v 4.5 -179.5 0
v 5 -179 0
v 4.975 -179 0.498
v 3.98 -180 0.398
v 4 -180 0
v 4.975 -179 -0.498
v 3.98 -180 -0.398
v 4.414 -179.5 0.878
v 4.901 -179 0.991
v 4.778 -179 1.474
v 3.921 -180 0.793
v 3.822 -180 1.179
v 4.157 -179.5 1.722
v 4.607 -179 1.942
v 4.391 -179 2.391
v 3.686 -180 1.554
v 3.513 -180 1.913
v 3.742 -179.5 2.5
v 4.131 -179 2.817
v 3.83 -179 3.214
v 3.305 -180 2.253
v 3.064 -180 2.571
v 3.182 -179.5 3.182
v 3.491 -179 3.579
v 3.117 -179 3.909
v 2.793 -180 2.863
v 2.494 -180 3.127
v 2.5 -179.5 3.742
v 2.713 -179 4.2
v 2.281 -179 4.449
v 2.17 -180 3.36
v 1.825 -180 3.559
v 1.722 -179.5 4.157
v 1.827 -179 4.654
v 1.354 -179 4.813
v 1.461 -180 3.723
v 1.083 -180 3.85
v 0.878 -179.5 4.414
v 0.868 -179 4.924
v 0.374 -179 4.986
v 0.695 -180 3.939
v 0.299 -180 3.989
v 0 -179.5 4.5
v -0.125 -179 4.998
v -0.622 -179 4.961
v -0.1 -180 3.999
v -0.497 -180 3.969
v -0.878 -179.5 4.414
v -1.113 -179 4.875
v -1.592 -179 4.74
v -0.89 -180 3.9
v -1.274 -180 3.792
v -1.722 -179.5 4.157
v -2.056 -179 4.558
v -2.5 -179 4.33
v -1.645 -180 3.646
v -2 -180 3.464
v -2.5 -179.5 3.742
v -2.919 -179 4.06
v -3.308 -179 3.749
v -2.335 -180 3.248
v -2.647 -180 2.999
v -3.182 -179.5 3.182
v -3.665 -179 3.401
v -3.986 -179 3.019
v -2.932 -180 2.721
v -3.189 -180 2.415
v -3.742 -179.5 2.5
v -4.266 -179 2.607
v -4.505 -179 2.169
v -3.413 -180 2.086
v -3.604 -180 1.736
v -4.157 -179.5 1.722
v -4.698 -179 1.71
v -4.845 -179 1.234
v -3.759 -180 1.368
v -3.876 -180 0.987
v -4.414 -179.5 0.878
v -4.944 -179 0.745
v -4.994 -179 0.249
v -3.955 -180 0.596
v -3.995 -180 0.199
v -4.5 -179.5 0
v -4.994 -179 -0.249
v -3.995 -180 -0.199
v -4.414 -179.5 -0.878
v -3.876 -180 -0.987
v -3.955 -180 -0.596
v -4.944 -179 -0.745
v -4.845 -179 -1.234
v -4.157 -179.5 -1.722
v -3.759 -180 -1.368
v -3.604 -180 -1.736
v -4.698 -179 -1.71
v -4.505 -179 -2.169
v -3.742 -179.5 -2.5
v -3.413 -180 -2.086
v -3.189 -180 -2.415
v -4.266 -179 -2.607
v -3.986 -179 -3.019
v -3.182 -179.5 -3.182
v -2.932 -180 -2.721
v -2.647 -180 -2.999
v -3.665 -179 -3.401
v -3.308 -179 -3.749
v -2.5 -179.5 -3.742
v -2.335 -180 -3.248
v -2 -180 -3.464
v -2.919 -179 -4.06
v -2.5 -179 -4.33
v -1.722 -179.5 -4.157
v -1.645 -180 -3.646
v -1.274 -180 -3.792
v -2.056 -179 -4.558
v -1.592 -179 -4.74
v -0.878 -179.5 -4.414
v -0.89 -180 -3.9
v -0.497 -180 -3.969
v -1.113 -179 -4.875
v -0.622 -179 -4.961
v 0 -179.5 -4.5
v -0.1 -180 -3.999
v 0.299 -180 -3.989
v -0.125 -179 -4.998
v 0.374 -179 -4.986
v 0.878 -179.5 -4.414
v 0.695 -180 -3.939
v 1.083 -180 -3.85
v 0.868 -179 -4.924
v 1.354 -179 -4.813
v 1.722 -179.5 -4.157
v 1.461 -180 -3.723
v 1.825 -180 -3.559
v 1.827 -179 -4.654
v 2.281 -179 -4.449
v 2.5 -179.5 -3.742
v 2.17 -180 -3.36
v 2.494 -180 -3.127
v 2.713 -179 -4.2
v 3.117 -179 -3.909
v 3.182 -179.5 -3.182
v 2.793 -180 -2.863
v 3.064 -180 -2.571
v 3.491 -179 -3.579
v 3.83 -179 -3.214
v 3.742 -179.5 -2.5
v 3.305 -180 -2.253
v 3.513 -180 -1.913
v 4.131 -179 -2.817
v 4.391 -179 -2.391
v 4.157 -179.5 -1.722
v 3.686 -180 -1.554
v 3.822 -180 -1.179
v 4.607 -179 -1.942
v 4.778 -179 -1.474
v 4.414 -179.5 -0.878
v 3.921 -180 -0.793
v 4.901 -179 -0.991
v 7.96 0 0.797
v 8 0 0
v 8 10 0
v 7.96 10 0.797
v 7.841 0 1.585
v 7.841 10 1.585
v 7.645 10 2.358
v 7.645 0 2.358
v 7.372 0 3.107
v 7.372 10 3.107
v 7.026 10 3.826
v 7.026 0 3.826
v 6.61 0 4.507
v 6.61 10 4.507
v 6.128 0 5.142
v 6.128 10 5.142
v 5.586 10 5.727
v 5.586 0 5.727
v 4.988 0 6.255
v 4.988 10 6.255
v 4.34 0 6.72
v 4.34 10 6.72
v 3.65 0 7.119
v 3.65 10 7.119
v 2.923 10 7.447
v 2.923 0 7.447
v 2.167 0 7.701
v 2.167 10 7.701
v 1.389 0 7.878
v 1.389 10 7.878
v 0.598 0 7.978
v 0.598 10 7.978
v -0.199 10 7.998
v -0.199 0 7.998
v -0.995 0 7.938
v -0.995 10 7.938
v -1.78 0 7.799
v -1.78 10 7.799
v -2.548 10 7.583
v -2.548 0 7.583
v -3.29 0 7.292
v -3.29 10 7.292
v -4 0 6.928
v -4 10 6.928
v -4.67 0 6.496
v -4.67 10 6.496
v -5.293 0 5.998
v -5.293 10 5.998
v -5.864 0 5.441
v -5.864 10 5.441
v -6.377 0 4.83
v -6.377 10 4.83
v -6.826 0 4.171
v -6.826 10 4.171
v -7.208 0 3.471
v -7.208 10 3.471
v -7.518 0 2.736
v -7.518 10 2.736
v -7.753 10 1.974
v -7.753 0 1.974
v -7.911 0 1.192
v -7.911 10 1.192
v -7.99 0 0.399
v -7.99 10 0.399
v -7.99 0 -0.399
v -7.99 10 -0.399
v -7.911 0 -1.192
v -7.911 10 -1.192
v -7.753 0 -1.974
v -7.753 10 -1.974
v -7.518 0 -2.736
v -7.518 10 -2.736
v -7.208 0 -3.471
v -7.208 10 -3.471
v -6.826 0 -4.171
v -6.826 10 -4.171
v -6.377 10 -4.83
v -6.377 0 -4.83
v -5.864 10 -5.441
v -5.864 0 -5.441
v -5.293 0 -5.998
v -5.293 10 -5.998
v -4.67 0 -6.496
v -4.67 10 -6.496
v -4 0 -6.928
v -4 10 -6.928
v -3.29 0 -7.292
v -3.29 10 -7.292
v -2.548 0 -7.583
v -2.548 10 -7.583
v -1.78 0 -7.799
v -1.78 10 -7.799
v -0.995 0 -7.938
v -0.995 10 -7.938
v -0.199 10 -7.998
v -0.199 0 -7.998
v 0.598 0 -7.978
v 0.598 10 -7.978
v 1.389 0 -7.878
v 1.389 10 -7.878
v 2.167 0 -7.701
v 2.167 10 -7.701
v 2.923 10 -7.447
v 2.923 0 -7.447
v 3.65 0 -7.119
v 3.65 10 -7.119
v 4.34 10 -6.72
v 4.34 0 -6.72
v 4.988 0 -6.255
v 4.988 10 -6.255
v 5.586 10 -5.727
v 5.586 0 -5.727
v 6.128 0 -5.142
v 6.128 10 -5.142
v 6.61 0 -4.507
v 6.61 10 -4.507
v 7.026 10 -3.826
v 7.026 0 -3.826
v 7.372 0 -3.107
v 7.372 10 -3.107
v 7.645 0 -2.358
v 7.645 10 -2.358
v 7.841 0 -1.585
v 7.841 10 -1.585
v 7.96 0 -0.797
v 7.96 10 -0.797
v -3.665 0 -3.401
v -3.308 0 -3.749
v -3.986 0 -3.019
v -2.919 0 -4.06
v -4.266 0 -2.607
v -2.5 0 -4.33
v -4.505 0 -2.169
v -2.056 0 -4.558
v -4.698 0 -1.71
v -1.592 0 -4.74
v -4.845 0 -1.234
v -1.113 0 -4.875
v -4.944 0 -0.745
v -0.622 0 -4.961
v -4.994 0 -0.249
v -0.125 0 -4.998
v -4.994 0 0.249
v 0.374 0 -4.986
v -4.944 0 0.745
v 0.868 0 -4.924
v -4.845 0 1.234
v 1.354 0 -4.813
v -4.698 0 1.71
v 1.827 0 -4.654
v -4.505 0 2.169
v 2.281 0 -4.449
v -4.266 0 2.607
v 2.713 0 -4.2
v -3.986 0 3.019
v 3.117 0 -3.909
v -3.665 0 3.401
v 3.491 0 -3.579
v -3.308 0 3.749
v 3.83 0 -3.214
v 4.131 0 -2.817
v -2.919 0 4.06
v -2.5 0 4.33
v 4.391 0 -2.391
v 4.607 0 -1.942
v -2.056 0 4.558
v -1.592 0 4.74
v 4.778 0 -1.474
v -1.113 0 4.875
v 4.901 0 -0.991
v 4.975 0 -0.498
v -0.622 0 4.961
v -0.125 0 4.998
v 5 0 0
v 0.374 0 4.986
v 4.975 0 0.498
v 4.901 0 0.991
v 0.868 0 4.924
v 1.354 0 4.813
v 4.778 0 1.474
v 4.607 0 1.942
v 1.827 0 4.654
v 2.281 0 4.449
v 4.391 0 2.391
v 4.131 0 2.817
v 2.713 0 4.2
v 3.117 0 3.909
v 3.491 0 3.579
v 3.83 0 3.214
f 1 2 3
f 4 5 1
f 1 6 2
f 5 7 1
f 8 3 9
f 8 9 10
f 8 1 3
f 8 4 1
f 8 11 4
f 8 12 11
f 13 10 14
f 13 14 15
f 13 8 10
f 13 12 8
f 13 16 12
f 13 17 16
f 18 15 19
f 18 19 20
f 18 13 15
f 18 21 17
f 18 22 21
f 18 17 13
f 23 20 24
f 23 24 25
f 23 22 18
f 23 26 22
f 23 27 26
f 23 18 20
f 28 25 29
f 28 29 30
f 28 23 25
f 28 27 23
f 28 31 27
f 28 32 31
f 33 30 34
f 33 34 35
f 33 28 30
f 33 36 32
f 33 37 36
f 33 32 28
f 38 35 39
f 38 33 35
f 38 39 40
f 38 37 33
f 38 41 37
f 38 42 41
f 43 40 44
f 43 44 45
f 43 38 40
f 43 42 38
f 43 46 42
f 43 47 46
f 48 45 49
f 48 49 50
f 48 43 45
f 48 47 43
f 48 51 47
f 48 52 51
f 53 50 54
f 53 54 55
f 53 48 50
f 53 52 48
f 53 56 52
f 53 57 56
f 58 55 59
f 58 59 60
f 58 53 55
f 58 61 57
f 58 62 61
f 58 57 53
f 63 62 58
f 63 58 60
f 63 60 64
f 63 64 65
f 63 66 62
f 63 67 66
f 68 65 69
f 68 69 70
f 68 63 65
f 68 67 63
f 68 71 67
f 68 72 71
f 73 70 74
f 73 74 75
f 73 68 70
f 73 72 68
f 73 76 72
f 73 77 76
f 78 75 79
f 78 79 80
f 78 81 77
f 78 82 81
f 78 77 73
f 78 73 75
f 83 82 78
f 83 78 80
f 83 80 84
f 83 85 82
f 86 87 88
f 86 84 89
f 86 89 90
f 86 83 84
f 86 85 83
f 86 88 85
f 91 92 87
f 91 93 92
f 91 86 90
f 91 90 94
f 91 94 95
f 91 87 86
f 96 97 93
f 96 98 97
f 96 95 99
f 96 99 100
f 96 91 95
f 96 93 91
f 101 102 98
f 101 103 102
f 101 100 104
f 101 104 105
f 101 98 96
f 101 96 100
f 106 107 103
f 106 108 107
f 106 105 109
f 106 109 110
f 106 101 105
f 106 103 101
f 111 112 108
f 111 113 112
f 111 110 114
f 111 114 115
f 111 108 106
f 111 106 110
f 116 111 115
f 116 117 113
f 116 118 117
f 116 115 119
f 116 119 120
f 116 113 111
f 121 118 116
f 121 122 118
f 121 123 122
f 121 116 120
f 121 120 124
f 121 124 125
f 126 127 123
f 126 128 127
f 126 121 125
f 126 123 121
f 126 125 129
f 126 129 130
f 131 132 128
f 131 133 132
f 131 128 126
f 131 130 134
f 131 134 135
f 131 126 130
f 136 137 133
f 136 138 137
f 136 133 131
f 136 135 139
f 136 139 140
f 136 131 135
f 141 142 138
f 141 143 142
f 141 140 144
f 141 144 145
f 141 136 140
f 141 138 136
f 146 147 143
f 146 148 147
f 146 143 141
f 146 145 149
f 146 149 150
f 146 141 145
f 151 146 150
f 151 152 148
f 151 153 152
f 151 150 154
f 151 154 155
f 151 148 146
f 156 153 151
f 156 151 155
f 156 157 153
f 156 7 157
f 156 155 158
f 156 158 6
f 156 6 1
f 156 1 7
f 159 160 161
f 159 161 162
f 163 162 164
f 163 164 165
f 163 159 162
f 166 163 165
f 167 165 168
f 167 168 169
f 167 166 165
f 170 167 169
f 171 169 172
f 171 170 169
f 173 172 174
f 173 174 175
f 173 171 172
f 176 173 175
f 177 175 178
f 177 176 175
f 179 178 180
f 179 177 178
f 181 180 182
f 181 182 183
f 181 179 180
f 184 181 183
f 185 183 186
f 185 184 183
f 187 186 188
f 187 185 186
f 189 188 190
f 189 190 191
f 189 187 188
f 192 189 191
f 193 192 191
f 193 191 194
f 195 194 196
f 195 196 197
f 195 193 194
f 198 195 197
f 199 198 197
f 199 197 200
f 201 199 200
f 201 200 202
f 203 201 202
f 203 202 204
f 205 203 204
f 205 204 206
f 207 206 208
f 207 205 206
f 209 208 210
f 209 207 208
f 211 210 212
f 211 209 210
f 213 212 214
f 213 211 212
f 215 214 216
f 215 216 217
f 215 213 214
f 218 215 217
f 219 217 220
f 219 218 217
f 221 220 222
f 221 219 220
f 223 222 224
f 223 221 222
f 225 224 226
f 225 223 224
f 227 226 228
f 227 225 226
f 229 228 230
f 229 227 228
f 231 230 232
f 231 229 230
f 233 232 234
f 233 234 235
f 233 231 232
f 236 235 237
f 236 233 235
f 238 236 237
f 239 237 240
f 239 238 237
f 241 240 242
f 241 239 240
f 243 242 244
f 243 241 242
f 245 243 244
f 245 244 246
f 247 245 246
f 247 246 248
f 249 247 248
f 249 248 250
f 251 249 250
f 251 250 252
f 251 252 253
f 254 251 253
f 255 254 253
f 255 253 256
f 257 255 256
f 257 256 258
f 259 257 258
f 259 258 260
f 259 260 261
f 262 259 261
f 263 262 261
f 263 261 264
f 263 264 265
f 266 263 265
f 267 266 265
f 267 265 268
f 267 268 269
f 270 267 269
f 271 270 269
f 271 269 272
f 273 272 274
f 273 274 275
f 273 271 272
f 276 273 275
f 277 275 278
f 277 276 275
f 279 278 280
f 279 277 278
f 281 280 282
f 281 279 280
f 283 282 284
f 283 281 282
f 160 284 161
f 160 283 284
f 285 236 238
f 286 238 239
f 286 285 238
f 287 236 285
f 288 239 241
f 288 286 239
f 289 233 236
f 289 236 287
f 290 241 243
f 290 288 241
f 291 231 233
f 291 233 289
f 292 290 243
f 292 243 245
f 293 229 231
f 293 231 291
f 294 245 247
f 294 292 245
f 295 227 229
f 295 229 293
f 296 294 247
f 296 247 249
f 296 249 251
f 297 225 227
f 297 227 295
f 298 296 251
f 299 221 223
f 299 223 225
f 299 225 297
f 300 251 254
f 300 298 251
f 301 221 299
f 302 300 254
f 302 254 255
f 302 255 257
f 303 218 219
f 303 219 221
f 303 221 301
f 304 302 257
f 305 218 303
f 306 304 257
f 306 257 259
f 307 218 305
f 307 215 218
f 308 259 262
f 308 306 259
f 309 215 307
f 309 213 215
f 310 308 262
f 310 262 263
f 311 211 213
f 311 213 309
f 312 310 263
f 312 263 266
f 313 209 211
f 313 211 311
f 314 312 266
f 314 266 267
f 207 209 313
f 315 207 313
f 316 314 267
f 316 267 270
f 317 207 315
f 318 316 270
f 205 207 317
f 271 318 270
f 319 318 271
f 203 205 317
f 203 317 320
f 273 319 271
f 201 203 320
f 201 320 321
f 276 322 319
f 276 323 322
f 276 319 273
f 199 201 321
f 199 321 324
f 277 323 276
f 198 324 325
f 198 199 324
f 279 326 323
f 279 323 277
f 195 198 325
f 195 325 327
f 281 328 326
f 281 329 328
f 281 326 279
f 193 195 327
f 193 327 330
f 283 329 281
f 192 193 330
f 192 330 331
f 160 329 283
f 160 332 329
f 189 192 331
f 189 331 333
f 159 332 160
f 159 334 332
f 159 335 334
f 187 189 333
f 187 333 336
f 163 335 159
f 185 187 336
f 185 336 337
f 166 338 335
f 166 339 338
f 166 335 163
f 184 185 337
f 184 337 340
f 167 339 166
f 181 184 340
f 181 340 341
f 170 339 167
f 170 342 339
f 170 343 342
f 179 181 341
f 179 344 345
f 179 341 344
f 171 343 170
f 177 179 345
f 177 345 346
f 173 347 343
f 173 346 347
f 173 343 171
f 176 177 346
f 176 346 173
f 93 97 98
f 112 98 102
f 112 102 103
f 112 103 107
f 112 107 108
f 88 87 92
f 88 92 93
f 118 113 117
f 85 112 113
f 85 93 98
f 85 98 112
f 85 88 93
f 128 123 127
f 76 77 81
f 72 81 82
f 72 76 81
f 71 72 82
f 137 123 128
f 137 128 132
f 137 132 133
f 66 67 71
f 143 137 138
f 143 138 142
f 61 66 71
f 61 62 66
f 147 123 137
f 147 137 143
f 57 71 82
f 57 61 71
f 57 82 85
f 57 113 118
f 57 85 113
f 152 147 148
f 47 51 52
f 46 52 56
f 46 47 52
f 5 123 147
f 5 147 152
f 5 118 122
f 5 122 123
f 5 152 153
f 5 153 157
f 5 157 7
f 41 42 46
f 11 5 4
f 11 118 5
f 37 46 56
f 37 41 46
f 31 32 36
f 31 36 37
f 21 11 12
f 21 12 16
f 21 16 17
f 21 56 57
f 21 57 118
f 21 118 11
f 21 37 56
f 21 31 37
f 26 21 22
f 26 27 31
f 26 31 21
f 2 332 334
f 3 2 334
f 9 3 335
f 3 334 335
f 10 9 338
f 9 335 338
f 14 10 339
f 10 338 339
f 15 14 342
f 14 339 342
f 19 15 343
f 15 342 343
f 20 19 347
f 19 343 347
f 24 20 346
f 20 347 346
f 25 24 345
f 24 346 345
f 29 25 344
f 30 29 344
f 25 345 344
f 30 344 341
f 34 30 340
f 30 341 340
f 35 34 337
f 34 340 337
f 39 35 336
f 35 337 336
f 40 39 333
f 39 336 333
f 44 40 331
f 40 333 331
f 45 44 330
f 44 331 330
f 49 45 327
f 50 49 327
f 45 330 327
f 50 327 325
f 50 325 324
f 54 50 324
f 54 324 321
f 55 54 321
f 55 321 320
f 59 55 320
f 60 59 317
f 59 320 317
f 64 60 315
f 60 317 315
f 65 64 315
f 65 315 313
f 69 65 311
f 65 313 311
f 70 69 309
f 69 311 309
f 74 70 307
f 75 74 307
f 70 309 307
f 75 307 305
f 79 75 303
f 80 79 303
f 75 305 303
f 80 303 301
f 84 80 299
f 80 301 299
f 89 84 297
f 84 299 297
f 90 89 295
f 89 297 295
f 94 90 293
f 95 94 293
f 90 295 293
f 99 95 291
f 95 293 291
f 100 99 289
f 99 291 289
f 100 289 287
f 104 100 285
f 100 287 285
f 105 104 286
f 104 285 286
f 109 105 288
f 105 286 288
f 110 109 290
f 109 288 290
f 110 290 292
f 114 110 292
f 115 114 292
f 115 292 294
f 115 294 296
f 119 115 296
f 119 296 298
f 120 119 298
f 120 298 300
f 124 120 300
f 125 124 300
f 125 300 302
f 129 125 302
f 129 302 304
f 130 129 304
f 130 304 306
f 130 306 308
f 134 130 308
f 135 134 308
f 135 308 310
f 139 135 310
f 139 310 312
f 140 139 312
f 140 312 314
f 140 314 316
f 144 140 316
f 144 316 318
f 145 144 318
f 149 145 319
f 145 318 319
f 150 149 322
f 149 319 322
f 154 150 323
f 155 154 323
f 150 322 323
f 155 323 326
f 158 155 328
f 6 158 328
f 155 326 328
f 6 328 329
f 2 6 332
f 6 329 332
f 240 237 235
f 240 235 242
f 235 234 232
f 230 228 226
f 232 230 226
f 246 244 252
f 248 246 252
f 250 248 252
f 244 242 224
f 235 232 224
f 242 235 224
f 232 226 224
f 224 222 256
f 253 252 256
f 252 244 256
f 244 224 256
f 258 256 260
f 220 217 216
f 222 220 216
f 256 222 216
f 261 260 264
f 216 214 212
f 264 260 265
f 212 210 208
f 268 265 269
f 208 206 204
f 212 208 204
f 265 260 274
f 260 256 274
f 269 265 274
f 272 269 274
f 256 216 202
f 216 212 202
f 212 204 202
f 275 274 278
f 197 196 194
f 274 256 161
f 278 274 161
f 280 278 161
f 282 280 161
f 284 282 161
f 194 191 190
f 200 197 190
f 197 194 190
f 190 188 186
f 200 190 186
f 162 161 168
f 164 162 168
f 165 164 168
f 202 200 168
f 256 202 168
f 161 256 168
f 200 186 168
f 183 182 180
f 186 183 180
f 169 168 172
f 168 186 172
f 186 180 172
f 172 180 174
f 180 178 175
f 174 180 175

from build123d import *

# Parameters (mm, degrees)
F0_R     = 8
F0_R_2   = 5
F1_DEPTH = 10
F2_DEPTH = 180
F3_SIZE  = 1


with BuildPart() as f1:
    # F0 (on Front) → F1 (new body)
    with BuildSketch(Plane.XZ):
        Circle(F0_R)
        Circle(F0_R_2, mode=Mode.SUBTRACT)
        Circle(F0_R_2)
    extrude(amount=-F1_DEPTH)

    # F0 (on Front) → F2 (join)
    with BuildSketch(Plane.XZ):
        Circle(F0_R_2)
    extrude(amount=F2_DEPTH)

    # F3
    f3_edges = [f1.edges().sort_by_distance(p)[0] for p in [
        (-5, -180, 0),
    ]]
    chamfer(f3_edges, length=F3_SIZE)


solid = f1.part
